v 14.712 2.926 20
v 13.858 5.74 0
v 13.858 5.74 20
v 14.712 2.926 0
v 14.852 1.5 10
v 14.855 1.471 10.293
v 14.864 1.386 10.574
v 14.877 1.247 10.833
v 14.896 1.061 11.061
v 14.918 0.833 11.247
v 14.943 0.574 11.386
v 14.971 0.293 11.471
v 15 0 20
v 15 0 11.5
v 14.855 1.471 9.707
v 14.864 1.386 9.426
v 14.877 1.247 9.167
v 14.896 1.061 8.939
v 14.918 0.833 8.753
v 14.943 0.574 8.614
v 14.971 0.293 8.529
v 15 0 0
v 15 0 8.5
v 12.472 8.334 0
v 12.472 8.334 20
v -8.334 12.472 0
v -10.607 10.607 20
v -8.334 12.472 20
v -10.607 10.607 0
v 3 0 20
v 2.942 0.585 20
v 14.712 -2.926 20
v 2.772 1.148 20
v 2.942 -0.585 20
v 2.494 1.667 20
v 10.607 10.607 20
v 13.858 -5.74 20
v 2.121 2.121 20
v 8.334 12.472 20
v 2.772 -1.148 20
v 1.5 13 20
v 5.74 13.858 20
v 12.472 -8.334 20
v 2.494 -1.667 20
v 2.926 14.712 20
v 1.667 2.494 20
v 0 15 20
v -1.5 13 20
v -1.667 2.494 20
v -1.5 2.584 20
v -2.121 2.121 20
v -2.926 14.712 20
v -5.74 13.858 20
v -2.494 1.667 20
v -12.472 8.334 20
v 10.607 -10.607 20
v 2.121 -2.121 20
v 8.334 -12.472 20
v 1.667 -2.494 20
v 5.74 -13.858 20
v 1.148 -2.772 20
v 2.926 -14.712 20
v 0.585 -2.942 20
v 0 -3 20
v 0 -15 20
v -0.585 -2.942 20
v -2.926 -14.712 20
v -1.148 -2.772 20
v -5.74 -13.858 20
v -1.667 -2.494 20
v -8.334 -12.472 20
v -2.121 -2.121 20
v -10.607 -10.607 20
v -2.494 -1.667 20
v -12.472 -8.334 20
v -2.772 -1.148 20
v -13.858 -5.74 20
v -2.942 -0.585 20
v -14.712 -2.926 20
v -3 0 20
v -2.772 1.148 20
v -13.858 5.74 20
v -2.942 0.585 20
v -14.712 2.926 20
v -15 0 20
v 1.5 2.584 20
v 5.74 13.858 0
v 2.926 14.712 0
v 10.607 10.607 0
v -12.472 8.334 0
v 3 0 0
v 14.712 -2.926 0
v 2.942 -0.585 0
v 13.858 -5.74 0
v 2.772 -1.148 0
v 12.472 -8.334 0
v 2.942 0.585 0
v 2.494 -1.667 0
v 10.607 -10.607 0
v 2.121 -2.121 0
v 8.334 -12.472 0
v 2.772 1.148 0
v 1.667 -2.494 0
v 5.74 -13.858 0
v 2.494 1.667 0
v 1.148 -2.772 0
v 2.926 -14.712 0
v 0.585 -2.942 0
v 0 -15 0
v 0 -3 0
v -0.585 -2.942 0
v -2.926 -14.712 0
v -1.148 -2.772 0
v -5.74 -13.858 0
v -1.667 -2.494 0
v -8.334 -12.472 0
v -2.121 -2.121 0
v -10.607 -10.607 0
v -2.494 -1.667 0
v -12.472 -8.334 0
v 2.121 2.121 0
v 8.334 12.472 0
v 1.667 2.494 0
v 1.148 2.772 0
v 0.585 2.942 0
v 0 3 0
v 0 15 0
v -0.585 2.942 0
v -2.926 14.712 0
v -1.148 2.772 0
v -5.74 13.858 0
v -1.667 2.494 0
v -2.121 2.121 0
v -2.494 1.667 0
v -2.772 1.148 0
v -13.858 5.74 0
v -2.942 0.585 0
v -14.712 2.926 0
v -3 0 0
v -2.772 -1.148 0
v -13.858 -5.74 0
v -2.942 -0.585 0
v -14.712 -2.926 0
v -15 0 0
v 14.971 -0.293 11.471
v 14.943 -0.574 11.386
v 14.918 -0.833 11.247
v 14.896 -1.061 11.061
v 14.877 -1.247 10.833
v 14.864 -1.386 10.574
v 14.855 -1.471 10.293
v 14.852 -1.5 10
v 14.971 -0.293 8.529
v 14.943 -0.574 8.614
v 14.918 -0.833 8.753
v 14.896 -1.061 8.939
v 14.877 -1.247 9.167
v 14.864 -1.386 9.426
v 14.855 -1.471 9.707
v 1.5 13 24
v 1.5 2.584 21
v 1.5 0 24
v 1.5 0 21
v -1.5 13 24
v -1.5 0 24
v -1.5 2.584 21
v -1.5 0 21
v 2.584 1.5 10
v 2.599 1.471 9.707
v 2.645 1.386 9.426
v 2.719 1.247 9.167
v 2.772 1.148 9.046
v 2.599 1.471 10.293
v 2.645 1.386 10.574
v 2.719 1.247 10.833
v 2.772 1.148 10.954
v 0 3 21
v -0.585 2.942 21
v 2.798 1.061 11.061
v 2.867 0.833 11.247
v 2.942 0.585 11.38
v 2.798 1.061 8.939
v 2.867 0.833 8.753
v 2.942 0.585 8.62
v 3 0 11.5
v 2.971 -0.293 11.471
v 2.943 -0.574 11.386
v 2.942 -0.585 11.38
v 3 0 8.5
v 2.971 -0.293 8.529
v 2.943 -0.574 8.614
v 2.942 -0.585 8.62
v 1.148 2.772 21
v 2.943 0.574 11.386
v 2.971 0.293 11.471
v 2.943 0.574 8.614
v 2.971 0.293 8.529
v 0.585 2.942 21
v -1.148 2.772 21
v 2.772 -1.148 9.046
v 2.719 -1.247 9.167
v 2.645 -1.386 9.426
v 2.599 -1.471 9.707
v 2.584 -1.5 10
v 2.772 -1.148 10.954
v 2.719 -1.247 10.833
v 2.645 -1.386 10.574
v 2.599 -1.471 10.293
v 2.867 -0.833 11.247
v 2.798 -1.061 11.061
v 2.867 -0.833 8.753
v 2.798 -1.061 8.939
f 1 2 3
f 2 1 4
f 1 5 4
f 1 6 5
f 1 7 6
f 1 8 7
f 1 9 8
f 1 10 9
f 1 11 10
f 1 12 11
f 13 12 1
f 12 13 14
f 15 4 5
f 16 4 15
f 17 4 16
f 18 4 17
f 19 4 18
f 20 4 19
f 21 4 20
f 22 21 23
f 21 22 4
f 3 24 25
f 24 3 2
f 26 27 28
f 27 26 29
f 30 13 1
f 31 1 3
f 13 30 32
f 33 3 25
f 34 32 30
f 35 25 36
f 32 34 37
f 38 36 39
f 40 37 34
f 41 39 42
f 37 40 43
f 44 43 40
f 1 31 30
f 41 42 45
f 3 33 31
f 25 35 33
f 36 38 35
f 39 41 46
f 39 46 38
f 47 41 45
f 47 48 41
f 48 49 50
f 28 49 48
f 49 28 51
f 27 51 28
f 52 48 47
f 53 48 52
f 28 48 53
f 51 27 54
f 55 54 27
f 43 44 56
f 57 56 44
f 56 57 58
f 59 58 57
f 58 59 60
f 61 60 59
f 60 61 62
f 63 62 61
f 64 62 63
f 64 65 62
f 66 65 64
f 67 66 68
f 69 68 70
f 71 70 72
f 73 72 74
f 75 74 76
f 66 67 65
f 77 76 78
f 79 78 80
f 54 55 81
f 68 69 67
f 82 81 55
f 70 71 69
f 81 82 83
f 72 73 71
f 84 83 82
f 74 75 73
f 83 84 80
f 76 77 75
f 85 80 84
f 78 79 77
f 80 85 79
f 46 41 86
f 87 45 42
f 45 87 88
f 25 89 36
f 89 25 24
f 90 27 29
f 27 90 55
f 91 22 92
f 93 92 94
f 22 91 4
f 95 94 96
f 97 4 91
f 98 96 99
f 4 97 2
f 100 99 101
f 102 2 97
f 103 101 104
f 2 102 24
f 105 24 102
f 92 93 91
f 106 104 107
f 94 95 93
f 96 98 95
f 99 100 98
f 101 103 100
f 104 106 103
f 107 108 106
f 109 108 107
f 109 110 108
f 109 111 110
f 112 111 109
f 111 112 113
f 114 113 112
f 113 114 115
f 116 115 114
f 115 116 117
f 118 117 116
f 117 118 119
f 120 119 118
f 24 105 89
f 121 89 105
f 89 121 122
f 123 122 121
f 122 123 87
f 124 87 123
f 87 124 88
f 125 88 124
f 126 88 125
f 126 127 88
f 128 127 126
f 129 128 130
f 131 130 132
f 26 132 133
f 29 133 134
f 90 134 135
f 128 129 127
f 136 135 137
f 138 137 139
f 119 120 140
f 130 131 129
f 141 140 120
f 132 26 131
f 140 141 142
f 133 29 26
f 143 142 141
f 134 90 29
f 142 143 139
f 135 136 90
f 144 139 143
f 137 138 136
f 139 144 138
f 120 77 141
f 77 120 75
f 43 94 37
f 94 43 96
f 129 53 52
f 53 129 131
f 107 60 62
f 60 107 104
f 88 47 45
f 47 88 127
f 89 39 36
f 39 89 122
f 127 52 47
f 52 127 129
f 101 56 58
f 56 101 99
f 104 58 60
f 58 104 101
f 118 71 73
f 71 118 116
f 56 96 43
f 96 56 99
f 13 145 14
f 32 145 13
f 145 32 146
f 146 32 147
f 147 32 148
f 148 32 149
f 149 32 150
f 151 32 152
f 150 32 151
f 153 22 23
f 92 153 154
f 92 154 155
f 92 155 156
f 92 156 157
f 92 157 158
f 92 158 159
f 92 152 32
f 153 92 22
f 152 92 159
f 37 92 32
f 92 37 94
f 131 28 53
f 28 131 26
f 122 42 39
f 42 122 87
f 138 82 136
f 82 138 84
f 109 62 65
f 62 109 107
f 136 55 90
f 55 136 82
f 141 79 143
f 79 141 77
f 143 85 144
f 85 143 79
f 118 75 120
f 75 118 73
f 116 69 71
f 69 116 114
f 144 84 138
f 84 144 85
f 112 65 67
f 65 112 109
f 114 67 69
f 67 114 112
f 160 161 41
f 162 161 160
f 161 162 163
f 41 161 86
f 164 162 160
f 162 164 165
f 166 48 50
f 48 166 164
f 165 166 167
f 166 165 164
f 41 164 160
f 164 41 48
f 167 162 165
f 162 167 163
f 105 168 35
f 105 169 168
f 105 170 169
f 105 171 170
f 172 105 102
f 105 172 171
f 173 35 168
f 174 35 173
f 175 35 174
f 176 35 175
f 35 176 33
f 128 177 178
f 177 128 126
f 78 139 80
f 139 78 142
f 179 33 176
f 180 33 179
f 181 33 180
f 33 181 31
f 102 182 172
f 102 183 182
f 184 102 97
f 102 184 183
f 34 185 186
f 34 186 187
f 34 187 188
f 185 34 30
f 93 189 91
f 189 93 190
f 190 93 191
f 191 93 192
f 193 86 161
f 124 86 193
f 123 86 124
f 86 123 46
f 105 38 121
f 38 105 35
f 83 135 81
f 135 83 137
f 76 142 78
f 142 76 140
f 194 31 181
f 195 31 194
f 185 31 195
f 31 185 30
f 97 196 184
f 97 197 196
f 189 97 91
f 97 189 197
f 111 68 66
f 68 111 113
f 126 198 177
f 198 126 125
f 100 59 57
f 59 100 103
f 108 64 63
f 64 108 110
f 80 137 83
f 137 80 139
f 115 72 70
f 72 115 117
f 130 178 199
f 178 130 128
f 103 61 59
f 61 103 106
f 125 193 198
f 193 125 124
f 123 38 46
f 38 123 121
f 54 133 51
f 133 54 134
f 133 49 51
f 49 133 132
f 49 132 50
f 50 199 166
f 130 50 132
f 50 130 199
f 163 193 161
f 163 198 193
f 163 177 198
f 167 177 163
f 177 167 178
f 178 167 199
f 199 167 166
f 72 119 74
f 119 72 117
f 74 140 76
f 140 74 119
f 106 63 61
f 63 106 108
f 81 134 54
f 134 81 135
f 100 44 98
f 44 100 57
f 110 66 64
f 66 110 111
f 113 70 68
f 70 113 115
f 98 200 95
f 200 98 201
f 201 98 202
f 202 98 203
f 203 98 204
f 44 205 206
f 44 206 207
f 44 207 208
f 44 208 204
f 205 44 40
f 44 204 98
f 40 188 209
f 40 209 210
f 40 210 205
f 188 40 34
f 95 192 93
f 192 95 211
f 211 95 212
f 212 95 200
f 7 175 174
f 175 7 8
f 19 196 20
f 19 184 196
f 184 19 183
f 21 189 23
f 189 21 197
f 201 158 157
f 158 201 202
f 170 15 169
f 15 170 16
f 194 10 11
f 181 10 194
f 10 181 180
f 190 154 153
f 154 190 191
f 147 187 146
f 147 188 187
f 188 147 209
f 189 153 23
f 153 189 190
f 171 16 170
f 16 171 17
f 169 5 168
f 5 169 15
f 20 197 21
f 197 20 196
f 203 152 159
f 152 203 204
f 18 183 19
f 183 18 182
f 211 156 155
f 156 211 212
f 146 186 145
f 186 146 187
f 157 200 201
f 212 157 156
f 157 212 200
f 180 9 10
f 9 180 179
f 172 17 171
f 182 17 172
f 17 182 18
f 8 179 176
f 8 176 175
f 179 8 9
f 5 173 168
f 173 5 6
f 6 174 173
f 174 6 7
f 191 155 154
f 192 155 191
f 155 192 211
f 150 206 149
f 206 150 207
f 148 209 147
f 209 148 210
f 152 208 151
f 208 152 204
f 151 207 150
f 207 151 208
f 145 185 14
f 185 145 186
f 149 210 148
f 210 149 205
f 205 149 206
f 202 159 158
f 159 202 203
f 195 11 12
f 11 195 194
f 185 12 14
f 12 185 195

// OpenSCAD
$fn = 32;

// ----------------------------------------------------------------------
// Control knob: pointer knob
// ----------------------------------------------------------------------

// --- parameters (mm) ---
rib_w = 3;                // pointer rib width
rib_h = 5;                // pointer rib height
knob_d = 30;              // knob body diameter
knob_h = 20;              // knob body height
bore_d = 6;               // shaft bore diameter
set_d = 3;                // set screw bore diameter

rib_poke = rib_h - 1;  // rib height above the top
total_h = knob_h + rib_h - 1;  // overall height

difference() {
  union() {
    cylinder(h = knob_h, d = knob_d);
    translate([-rib_w / 2, 0, knob_h - 1])
      cube([rib_w, knob_d / 2 - 2, rib_h]);
  }
  translate([0, 0, -1]) cylinder(h = knob_h + 2, d = bore_d);
  translate([-1, 0, knob_h / 2]) rotate([0, 90, 0])
    cylinder(h = knob_d / 2 + bore_d / 2 + 2, d = set_d);}
